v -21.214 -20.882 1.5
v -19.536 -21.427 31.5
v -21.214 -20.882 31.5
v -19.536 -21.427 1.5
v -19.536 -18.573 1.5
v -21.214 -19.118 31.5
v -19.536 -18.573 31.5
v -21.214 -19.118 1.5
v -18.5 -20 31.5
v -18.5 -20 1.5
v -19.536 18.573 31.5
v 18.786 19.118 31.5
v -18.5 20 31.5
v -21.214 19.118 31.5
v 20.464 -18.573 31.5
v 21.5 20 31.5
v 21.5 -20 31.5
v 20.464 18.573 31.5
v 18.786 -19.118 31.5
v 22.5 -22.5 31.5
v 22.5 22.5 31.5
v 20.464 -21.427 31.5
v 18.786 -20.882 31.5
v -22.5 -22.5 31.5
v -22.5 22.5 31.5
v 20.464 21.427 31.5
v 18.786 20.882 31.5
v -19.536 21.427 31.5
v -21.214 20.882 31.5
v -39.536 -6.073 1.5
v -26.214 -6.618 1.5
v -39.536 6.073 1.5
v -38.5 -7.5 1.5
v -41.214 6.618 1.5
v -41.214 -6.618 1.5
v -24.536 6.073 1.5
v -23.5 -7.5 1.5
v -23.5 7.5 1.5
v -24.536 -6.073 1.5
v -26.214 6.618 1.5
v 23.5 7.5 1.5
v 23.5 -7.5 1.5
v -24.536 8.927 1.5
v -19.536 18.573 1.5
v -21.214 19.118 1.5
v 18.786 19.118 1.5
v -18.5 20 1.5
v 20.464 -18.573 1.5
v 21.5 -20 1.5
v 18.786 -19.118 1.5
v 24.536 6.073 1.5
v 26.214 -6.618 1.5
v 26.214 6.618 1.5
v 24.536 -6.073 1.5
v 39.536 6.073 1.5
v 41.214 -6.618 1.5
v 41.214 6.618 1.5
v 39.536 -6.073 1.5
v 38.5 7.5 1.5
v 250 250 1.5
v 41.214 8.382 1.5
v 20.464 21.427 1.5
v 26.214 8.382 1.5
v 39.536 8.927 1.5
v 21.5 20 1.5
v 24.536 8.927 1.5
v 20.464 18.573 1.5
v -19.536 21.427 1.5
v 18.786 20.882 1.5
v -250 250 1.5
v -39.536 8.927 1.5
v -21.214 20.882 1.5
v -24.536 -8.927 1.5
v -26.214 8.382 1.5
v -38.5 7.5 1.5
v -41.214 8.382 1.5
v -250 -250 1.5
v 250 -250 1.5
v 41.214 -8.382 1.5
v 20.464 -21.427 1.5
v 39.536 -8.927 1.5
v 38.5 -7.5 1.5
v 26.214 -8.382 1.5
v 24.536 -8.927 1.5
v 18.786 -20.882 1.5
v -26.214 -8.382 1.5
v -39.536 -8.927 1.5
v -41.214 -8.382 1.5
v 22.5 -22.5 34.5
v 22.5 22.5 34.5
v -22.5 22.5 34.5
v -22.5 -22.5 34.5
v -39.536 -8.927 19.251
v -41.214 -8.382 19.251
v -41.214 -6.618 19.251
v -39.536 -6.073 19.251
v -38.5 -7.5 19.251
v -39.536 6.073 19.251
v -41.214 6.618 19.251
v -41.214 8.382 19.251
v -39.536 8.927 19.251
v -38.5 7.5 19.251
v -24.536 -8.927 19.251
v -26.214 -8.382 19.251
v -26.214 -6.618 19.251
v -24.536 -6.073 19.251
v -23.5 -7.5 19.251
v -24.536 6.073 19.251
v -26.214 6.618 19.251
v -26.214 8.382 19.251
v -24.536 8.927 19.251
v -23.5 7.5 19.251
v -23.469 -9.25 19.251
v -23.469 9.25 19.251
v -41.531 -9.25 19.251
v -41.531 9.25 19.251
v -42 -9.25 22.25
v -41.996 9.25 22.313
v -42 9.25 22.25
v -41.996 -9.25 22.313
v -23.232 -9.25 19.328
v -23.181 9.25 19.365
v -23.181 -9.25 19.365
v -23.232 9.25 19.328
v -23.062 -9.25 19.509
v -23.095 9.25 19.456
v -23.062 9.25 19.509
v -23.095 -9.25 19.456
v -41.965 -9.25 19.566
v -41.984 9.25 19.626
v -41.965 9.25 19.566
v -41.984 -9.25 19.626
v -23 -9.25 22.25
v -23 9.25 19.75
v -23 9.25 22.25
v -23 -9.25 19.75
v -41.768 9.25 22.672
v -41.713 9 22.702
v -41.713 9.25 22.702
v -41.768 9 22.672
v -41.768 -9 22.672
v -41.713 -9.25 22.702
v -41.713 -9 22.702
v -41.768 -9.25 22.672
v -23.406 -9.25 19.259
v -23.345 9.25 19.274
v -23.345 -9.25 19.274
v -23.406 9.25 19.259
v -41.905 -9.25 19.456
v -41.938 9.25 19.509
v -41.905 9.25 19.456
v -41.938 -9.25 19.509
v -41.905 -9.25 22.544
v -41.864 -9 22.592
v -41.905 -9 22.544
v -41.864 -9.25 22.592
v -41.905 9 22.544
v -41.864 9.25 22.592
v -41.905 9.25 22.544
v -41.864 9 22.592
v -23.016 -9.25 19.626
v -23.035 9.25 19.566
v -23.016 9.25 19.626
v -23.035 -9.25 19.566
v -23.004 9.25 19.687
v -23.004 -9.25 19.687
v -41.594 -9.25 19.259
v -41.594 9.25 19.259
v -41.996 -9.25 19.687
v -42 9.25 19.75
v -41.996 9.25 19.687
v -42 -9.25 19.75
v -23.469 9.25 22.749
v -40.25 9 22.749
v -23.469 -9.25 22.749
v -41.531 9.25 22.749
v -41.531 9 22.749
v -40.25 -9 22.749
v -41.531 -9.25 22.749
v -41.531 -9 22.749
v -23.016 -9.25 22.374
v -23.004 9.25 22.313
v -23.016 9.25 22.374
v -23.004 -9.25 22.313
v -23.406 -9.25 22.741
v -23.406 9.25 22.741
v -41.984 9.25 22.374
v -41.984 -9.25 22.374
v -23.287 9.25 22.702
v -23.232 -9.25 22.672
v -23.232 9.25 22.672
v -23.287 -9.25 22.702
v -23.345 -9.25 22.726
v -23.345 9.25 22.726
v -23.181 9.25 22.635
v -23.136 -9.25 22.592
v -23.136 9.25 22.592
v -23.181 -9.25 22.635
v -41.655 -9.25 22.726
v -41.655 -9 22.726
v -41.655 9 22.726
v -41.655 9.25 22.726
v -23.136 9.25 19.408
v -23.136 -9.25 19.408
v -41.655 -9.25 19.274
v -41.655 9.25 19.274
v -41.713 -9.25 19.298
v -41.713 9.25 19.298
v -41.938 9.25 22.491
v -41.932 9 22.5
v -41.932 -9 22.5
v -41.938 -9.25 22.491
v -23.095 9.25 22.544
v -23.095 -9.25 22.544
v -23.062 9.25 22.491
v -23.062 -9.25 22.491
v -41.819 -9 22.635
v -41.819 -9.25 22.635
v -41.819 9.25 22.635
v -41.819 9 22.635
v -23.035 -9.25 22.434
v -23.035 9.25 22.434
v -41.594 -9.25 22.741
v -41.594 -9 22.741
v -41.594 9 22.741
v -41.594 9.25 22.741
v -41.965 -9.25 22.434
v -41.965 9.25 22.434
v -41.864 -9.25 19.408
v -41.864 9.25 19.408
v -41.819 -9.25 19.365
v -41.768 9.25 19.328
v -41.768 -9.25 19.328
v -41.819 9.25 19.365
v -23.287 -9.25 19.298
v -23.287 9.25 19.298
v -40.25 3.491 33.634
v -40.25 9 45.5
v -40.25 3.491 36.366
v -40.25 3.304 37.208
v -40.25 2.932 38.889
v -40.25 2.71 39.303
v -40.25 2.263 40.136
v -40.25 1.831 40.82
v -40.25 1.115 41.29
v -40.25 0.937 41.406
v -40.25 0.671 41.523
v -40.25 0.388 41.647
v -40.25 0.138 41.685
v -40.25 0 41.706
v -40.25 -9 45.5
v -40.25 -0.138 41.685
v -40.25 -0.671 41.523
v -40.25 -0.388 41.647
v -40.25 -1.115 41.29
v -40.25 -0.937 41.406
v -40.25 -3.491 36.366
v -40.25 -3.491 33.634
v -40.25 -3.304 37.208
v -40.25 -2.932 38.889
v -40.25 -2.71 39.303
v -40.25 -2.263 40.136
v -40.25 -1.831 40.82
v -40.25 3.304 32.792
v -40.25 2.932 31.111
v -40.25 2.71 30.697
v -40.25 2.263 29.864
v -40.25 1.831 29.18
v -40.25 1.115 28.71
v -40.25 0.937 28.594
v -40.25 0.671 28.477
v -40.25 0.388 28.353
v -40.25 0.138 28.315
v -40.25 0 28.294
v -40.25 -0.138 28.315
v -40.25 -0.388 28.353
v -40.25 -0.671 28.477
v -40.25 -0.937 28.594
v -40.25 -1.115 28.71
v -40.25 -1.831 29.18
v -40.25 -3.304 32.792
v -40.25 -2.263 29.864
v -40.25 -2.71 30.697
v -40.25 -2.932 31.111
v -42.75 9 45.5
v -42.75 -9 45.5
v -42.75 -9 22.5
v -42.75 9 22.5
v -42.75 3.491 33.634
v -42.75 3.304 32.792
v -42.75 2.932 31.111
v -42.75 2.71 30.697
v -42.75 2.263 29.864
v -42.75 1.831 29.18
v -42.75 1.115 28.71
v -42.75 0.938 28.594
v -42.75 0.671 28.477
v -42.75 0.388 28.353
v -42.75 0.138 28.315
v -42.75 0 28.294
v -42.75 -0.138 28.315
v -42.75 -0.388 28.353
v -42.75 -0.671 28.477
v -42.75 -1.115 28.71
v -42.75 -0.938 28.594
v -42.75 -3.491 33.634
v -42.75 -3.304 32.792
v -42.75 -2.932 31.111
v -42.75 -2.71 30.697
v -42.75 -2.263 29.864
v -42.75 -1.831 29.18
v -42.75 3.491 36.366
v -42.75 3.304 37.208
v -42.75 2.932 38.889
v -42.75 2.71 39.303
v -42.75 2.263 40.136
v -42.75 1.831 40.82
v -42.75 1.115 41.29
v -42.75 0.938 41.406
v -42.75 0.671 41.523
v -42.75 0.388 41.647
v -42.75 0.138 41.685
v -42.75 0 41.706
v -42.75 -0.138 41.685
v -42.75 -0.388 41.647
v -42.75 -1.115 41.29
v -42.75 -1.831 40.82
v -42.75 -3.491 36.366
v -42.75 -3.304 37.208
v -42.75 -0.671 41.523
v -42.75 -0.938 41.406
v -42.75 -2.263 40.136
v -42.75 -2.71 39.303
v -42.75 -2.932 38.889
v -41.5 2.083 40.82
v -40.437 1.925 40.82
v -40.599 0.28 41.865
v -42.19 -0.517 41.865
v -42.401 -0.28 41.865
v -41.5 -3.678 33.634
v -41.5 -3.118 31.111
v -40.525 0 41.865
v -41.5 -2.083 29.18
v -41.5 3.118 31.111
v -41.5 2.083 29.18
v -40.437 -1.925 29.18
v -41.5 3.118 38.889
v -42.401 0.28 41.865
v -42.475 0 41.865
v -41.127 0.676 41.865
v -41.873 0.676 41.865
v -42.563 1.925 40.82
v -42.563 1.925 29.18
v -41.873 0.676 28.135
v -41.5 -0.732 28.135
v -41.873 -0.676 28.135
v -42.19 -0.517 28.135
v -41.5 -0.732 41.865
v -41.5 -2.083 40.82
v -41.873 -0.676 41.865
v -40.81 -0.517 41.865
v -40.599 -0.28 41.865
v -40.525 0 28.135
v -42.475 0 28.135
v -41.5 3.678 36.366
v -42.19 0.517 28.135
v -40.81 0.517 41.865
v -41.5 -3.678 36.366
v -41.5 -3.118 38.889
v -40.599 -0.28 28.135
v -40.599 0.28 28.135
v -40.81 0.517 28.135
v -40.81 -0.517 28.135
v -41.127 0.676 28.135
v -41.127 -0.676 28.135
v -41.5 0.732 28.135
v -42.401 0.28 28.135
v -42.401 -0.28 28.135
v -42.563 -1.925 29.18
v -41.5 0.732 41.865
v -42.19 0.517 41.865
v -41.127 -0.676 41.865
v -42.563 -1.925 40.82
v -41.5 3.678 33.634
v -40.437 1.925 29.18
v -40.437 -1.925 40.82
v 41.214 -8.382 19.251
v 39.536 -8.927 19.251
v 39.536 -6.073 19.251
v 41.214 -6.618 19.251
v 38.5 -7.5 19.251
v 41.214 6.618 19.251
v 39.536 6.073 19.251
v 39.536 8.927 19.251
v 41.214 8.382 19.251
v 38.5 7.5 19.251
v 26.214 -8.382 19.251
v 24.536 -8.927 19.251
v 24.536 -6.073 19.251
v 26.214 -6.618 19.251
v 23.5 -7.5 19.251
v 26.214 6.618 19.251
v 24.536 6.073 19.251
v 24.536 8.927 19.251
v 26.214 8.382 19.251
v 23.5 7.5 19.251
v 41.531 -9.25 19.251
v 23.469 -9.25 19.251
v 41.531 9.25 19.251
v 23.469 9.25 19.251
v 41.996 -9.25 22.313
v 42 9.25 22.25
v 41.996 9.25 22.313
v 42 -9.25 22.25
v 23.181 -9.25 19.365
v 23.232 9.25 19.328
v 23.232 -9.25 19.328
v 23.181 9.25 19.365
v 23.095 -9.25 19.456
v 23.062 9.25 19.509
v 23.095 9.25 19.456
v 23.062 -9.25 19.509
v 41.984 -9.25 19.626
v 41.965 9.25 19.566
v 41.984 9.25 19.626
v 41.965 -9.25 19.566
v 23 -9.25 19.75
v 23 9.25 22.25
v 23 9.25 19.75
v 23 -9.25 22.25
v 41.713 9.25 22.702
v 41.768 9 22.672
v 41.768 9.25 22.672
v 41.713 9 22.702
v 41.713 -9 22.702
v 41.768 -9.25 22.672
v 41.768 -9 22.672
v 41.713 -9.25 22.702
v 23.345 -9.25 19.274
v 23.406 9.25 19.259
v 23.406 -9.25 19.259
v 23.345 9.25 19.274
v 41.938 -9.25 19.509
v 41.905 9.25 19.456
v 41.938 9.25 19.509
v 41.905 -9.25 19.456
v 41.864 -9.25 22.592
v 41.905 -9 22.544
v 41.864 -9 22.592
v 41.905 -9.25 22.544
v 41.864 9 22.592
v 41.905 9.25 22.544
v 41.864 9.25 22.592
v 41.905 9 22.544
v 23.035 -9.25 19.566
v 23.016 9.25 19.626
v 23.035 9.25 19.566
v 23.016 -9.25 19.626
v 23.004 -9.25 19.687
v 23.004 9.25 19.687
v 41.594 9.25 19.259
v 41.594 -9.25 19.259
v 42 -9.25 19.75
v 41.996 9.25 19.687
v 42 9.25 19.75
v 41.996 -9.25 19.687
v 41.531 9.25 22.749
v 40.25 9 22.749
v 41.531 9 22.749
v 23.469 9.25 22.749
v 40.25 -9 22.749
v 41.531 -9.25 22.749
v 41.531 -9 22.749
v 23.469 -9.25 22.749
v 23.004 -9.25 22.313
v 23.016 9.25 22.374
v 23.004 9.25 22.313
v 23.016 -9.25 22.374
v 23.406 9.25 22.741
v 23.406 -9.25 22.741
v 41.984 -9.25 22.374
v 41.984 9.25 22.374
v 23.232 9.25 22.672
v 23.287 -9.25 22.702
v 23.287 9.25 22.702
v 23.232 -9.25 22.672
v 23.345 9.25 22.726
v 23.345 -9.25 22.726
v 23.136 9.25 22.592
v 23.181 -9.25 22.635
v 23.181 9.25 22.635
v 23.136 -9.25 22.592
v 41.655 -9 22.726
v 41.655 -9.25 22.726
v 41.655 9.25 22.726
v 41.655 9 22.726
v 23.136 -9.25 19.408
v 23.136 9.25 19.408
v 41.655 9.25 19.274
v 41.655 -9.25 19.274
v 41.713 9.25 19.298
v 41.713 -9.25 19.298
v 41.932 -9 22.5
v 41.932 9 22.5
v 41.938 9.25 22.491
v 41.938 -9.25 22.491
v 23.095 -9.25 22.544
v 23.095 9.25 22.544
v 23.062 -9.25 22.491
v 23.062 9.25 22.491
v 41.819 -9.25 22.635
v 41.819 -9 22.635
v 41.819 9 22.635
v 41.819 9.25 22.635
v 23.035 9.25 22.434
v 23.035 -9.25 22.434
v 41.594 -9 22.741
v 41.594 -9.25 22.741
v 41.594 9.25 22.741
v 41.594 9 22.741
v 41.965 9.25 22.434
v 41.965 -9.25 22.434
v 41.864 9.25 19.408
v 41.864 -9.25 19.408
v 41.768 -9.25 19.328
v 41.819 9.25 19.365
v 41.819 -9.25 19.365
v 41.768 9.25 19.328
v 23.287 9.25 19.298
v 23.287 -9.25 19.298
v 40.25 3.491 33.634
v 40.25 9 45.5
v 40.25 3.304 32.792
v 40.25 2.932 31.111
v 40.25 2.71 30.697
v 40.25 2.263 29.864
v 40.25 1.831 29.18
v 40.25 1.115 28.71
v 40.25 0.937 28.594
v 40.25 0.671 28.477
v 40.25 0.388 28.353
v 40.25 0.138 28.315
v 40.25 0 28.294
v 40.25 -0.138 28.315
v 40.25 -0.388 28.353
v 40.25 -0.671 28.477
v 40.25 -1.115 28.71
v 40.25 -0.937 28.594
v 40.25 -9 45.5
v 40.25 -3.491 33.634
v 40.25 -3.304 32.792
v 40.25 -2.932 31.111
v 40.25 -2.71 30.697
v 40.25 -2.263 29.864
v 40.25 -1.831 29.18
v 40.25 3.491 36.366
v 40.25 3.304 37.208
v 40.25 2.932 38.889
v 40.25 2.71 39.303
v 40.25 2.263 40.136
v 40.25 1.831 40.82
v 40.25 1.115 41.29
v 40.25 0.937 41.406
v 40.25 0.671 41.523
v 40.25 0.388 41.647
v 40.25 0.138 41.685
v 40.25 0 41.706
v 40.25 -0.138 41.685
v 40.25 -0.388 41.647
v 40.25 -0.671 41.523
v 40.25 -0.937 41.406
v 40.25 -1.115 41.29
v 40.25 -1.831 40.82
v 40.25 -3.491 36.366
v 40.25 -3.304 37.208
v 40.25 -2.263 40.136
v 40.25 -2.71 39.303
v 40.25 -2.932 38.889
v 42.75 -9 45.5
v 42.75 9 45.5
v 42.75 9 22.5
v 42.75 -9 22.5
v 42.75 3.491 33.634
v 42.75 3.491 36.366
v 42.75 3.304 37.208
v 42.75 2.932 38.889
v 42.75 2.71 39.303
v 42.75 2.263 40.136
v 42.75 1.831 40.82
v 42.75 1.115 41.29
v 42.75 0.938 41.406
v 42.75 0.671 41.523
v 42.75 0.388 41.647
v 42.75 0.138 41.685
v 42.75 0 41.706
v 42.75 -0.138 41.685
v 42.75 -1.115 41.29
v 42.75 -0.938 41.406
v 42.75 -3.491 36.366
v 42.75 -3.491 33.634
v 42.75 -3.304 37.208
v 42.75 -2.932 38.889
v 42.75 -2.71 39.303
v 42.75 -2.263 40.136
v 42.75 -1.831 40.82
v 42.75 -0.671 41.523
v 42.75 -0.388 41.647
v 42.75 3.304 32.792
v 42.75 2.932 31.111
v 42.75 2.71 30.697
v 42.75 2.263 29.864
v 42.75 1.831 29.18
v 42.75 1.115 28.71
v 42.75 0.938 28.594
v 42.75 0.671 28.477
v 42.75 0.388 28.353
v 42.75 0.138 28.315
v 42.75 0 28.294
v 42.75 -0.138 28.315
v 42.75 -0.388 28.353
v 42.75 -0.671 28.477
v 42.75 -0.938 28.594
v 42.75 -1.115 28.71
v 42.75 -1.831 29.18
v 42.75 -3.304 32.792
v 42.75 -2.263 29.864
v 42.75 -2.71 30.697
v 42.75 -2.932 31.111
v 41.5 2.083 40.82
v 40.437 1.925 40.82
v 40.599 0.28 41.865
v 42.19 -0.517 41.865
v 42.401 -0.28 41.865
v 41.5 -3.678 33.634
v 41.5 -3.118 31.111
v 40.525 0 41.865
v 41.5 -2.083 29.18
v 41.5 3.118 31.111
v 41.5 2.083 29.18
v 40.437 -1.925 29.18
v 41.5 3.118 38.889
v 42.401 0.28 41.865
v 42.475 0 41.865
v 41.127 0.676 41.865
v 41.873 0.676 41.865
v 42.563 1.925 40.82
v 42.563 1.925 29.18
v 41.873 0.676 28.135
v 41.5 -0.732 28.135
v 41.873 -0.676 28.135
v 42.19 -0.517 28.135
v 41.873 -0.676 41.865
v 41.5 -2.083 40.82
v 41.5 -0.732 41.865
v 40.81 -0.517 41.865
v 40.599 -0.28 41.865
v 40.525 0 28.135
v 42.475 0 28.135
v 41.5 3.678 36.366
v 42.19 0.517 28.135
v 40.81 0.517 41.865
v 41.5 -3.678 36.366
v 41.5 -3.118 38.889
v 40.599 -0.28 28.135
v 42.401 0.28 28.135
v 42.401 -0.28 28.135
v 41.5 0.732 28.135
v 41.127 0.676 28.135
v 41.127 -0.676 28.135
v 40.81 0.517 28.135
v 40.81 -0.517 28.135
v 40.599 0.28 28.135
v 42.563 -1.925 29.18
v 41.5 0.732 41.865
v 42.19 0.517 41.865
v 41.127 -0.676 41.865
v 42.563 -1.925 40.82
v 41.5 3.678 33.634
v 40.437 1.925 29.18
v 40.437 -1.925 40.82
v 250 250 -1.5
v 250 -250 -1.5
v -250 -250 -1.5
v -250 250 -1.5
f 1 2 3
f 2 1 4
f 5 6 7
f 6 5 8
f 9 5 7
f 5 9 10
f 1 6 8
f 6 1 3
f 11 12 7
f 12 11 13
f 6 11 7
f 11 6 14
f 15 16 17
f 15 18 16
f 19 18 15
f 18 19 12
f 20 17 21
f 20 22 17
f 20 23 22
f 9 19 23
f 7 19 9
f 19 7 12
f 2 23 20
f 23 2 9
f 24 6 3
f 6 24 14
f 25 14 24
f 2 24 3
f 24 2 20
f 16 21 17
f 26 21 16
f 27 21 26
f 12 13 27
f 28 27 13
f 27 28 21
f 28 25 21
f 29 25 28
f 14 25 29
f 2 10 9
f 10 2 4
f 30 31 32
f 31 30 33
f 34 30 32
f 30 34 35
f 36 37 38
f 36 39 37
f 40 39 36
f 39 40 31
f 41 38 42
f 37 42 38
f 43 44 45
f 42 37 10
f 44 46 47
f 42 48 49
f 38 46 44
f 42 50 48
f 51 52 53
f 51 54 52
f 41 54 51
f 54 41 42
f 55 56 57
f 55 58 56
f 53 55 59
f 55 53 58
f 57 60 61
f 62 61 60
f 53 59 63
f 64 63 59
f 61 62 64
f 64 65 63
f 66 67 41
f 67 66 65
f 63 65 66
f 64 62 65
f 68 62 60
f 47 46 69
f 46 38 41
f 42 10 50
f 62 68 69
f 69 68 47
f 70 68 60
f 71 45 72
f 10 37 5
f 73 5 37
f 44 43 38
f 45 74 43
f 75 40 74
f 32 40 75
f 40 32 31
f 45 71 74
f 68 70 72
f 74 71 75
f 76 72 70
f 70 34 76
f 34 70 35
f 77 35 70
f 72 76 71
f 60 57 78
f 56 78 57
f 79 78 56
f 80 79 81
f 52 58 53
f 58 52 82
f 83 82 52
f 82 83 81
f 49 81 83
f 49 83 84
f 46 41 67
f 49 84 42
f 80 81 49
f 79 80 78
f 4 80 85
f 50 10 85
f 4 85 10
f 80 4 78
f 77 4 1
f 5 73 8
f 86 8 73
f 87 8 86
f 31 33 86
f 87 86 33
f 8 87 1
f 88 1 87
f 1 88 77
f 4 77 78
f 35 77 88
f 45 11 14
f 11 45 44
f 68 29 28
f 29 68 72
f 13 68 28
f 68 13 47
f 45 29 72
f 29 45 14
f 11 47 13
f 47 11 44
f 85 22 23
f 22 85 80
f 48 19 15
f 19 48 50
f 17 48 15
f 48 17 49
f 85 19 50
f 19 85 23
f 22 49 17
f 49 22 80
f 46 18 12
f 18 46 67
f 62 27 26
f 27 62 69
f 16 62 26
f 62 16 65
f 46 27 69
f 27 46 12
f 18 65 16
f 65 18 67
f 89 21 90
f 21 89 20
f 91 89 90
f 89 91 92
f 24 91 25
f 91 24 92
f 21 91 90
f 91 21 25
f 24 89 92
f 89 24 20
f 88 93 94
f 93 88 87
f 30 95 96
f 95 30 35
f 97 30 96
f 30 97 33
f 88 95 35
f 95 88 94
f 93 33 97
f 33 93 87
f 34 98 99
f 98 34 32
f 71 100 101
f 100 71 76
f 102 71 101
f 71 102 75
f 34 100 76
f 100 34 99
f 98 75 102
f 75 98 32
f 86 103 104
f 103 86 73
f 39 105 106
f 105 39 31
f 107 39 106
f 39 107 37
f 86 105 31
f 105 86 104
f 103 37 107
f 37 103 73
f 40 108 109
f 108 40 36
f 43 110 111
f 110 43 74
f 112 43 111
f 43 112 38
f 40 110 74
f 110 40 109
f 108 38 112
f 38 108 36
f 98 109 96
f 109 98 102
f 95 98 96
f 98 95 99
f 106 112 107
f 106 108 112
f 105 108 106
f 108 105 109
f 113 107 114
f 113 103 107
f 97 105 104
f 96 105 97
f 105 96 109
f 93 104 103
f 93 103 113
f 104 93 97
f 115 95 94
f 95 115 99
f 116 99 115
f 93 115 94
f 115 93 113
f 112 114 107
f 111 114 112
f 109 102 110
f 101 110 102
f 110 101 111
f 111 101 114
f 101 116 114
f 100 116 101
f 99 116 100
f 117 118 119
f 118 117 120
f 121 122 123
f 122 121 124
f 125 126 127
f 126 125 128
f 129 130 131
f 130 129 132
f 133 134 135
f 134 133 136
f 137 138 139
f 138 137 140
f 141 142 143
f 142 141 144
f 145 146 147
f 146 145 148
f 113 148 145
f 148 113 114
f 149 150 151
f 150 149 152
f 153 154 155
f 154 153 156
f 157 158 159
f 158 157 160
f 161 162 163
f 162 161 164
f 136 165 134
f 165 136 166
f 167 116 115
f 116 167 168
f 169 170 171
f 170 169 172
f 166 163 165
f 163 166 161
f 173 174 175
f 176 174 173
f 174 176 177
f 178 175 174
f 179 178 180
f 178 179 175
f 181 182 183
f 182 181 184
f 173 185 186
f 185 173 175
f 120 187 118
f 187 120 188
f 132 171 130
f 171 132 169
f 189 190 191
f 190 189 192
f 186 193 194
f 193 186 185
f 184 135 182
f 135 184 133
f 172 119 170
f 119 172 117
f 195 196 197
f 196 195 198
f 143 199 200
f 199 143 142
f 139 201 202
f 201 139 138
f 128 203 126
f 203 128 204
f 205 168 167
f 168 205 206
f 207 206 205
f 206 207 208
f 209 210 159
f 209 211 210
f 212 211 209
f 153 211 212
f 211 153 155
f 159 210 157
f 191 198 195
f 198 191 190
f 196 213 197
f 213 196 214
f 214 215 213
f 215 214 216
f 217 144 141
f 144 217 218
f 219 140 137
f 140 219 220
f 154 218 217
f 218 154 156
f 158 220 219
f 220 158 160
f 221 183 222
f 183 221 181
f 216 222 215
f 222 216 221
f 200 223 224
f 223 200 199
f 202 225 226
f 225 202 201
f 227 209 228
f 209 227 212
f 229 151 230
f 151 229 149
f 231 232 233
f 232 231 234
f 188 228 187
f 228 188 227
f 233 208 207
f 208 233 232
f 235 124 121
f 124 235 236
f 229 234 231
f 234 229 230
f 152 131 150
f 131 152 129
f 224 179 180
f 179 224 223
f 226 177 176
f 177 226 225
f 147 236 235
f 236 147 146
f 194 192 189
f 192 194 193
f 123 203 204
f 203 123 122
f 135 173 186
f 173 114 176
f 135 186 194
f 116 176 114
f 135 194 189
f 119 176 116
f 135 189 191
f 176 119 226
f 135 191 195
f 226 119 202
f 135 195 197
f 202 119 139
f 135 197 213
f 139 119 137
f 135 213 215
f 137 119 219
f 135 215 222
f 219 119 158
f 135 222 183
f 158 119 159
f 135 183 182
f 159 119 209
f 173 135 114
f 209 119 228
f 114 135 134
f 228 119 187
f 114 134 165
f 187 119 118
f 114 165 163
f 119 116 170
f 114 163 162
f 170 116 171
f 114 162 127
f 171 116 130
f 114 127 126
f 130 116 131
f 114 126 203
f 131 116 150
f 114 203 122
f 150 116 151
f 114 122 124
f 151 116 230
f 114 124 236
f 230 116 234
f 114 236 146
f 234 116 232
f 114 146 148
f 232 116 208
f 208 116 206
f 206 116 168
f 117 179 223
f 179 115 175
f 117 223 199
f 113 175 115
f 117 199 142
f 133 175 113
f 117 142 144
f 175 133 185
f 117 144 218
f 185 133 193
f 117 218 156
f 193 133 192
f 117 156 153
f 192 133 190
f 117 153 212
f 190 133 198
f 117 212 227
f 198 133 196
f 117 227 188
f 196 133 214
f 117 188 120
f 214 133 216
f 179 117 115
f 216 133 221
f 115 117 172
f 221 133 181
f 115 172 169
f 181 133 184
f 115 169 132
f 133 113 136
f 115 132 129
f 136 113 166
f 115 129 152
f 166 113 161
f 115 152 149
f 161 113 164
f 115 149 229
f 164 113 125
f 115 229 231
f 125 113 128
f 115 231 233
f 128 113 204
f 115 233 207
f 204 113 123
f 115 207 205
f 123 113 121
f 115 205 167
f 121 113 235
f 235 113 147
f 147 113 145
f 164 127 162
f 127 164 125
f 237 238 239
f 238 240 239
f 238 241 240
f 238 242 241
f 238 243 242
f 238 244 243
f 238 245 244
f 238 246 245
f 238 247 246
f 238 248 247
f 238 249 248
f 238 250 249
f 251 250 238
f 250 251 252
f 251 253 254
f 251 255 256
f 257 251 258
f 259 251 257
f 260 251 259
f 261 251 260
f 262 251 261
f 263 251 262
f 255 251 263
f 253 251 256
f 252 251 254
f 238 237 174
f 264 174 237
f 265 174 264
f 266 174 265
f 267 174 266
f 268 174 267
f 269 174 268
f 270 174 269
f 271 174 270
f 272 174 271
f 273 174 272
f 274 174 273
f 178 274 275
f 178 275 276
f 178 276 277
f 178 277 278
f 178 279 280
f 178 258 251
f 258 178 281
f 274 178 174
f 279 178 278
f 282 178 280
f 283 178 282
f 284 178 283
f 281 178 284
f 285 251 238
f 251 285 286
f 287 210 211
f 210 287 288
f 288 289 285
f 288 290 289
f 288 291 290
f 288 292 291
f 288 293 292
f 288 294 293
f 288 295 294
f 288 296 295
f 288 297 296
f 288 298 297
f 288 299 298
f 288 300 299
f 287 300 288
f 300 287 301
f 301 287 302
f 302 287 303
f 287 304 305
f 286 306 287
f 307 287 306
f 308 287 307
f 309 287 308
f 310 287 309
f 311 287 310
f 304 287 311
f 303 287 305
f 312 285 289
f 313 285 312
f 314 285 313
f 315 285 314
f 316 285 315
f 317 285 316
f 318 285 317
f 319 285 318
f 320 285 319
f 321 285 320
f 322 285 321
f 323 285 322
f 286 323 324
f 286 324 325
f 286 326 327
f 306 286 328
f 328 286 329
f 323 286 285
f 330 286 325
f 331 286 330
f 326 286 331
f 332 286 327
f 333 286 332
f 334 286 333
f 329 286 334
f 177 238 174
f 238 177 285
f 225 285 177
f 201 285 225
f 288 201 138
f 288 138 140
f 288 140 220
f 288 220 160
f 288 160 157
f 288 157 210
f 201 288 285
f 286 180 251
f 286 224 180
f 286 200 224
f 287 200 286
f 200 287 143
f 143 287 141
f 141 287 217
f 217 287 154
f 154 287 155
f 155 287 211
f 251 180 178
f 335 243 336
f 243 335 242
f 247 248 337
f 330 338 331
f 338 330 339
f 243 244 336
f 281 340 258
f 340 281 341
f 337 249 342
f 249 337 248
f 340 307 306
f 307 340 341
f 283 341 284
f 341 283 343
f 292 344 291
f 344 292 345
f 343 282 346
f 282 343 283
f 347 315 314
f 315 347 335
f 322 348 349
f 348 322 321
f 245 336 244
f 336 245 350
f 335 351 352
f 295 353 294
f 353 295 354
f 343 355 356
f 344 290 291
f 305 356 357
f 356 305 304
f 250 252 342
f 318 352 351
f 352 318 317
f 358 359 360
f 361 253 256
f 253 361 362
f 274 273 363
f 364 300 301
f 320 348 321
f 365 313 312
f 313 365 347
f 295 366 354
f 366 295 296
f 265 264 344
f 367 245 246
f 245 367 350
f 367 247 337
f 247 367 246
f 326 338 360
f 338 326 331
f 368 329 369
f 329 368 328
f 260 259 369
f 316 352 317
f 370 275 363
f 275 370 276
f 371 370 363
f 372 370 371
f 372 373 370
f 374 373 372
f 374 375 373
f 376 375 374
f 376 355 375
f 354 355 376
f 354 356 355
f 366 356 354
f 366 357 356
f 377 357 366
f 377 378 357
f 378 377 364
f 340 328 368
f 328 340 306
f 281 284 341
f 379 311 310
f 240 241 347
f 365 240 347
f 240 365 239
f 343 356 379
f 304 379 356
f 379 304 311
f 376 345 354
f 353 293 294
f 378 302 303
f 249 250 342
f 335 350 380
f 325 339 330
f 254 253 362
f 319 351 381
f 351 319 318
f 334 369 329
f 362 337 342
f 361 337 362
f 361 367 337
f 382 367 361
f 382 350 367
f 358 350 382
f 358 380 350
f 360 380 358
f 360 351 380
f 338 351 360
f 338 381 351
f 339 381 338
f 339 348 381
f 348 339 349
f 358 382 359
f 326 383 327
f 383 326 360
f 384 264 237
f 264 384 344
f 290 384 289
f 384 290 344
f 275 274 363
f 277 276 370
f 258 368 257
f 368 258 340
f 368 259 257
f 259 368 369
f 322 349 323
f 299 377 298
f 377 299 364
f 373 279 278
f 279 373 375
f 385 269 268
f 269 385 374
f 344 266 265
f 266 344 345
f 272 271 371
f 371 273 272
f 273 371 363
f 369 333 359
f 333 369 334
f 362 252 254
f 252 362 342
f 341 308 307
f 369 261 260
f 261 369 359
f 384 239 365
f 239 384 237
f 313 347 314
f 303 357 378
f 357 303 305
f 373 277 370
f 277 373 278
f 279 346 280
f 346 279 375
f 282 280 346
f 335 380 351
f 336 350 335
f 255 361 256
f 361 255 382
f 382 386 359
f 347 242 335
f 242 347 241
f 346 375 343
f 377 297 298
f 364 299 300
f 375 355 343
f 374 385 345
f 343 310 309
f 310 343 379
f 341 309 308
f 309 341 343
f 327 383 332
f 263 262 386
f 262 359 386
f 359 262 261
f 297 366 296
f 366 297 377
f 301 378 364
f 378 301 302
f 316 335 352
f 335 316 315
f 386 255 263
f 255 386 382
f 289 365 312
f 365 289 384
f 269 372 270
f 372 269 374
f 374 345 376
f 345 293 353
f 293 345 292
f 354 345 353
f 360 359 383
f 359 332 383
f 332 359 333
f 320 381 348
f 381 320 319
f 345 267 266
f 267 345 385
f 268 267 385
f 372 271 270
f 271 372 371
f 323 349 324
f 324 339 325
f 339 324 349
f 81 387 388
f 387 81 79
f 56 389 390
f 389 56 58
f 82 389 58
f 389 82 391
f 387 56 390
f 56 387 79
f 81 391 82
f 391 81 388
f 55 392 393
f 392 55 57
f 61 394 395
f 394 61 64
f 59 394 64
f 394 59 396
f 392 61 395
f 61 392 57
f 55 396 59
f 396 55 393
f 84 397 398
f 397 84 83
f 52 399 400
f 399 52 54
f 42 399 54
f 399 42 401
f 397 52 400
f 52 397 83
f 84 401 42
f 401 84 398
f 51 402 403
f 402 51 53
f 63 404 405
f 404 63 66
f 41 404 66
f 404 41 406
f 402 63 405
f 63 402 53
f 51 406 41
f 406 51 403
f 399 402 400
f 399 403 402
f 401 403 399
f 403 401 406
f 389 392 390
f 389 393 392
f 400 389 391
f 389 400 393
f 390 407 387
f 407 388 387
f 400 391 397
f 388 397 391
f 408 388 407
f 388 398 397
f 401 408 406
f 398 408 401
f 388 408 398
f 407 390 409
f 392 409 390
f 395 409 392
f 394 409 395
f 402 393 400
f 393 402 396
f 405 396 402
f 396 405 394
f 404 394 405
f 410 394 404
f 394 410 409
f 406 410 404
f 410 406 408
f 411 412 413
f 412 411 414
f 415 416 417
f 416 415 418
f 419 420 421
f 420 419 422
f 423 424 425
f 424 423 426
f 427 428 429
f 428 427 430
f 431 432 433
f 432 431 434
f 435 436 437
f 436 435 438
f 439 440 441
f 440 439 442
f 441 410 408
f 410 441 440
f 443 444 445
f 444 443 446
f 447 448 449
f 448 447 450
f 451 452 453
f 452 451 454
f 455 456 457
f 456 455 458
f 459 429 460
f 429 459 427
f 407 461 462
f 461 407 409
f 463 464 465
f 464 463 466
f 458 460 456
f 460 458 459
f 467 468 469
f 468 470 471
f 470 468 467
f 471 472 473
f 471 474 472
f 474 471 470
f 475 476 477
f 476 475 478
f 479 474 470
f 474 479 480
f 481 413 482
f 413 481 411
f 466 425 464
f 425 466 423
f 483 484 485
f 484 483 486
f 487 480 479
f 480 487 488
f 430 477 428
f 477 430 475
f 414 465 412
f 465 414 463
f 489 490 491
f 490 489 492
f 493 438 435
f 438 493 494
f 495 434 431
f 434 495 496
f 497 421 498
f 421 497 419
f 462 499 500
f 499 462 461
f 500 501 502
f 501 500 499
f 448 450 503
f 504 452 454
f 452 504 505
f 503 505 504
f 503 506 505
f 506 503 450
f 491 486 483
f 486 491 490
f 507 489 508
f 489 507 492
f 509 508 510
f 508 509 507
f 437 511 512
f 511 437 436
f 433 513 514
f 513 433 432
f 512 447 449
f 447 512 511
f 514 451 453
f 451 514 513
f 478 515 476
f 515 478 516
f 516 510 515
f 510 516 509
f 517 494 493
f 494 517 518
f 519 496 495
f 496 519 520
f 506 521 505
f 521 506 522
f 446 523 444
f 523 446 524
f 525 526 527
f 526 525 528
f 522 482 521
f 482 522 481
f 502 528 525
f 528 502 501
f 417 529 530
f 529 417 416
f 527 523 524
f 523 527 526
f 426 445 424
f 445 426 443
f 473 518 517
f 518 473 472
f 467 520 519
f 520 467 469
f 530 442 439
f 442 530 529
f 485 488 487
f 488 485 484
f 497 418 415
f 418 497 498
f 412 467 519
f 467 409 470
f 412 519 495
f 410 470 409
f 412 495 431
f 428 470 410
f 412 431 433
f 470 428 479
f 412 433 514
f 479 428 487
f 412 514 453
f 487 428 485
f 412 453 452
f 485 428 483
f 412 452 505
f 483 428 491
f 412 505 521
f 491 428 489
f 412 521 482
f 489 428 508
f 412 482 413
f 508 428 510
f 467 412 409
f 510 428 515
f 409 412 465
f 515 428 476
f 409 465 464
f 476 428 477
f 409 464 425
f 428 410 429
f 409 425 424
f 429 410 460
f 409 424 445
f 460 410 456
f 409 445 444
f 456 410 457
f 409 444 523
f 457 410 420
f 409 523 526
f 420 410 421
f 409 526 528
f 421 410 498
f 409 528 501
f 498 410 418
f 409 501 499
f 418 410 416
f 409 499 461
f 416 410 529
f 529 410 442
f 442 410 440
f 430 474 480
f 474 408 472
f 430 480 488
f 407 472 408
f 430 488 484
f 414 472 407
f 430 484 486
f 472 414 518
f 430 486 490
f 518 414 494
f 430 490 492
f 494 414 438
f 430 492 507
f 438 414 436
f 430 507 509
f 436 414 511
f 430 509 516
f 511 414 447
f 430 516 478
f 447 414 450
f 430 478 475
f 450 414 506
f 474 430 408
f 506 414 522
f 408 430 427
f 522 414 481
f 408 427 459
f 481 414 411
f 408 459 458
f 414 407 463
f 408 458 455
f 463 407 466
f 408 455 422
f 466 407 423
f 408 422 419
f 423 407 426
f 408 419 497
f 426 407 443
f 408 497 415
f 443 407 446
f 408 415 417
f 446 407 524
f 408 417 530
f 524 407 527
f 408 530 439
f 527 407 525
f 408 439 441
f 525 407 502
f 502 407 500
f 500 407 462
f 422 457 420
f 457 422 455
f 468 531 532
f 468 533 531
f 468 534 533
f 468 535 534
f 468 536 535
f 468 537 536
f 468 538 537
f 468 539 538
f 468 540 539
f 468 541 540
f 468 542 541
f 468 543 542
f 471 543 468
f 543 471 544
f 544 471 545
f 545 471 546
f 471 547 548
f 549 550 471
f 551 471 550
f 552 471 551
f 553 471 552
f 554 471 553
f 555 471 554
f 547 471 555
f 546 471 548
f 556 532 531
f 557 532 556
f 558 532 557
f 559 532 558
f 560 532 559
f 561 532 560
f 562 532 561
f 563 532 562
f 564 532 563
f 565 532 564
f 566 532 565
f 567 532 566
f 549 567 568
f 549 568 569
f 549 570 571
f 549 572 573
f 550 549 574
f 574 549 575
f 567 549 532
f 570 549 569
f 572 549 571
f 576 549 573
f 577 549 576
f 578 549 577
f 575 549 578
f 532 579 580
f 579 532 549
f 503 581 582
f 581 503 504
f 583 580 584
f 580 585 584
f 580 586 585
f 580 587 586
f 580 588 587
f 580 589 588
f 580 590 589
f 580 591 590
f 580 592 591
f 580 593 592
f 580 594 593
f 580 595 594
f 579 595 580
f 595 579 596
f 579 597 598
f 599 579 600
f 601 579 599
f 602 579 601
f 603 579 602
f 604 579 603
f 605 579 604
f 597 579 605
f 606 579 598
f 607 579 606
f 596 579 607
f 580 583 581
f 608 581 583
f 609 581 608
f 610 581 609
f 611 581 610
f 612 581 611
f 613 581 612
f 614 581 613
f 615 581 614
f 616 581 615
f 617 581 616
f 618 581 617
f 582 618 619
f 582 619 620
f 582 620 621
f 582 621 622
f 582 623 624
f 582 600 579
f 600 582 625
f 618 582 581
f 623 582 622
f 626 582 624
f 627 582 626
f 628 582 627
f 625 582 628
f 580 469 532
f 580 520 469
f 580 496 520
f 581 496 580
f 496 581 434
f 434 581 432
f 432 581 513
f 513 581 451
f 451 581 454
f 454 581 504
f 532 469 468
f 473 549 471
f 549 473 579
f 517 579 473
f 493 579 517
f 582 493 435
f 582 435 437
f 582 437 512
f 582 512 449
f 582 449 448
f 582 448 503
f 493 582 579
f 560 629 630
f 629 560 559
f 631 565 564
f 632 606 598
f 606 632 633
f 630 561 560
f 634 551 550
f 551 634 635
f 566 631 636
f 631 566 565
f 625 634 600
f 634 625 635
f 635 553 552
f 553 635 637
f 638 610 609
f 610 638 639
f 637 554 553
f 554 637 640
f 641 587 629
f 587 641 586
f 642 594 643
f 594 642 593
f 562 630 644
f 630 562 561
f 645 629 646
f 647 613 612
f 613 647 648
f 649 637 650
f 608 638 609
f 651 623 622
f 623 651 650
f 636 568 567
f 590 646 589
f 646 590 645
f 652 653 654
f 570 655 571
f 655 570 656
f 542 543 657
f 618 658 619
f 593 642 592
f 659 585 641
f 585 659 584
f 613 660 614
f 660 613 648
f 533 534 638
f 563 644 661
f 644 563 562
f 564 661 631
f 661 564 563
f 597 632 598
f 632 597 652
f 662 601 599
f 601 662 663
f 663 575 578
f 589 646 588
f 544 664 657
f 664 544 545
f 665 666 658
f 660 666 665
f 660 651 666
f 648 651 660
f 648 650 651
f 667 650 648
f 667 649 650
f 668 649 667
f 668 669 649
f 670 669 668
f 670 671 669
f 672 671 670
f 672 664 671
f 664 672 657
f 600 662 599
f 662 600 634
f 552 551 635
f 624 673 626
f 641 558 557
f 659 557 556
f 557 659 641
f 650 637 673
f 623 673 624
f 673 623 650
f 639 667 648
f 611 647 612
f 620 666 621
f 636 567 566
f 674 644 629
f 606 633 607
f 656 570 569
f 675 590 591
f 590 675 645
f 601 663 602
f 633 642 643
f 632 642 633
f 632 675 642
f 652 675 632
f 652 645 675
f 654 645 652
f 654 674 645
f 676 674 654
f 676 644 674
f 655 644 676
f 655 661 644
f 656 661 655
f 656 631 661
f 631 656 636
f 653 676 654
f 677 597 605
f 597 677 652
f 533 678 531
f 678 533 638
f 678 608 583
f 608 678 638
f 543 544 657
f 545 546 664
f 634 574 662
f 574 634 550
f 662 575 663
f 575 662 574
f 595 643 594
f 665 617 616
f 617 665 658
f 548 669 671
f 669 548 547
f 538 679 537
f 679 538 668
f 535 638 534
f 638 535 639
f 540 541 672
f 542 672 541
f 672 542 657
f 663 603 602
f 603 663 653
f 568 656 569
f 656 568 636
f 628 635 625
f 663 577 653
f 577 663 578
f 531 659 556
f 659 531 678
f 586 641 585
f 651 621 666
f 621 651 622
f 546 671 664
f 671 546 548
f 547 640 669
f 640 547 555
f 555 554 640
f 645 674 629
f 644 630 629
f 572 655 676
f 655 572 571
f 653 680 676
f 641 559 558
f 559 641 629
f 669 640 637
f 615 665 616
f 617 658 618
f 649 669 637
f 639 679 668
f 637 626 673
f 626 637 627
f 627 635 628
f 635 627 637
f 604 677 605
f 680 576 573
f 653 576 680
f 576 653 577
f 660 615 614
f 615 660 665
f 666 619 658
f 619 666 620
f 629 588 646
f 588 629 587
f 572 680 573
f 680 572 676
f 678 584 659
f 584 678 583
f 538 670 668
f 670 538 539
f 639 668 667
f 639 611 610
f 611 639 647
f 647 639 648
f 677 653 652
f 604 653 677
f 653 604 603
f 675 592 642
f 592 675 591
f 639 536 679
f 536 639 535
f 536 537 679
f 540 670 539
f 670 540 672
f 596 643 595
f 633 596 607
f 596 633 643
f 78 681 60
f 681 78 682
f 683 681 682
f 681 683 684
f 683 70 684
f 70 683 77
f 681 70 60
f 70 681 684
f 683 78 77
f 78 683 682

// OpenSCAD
// file: libreriamuebles3.scad
module piso()
{
    cube([100,100,3], center=true);
}

module pisoexpandido()
{
    scale([5,5,1])piso();
}


module mesa()
{
    //30 pulgadas es el tamano normal de un mesa
    //primer pierna
    translate([-20,-20,1.5])cylinder(h=30,r=1.5);
    //segunda pierna
    translate([-20,20,1.5])cylinder(h=30,r=1.5);
    //tercera pierna
    translate([20,-20,1.5])cylinder(h=30,r=1.5);
    //cuarta pierna
    translate([20,20,1.5])cylinder(h=30,r=1.5);
    
    //tapa de la mesa
    //altura mitad piso(z) + mitad mesa(z) + altura pata
    translate([0,0,33])cube([45,45,3],center=true);
}

module conjuntodemesas(cantidad =3)
{
    for(z =[0:cantidad])
    {
    translate([150,-200 + 120 *z,0])scale([1,2,1])mesa();
    }
}

module sillasparalasmesas(cantidad = 3)
{
    for(z=[0:cantidad])
    {
    translate([150,-200+120*z,0]) mirror([1,0,0])silla();
    }
}


module filadesillas(cantidad =7)
{
    for(z=[0:cantidad])
    {
        translate([50,-160+40*z,0])color("Blue",1)silla();
    }
}

module sillasaudiencia(cantidad =2)
{
    for(z=[0:cantidad])
    {
        translate([-50*z,0,0])filadesillas();
    }
}





module sillaBase()
{
    translate([-40,-7.5,1.5])cylinder(h=18,r=1.5);
    
    translate([-40,7.5,1.5])cylinder(h=18,r=1.5);
    
    translate([-25,-7.5,1.5])cylinder(h=18,r=1.5);
    
    translate([-25,7.5,1.5])cylinder(h=18,r=1.5);
    
    //altura mitad piso(z) + mitad mesa(z) + altura pata
    translate([-32.5,0,21])minkowski()
    {
        cube([18,18,2.5],center=true);
        rotate([90,0,0])cylinder(h=0.5, r=0.5, center=true,$fn=50);
    }
}

module espaldar()
{
    difference(){
    translate([-41.5,0,34])cube([2.5,18,23],center=true);
    translate([-41.5,0,35])scale([1,.75,1.4])sphere(5);     
    }
}

module silla()
{
        sillaBase();
        espaldar();
}

silla();
// main file
//Alfredo Alvarez
// Escena de piso mesa y silla o posibles sillas
use <libreriamuebles3.scad>;

color("Lavender",1)pisoexpandido();
color("Red",1)mesa();
color("Blue",1)silla();
mirror([1,0,0])silla();

//pisoexpandido();
//conjuntodemesas();
//sillasparalasmesas();
//sillasaudiencia();
